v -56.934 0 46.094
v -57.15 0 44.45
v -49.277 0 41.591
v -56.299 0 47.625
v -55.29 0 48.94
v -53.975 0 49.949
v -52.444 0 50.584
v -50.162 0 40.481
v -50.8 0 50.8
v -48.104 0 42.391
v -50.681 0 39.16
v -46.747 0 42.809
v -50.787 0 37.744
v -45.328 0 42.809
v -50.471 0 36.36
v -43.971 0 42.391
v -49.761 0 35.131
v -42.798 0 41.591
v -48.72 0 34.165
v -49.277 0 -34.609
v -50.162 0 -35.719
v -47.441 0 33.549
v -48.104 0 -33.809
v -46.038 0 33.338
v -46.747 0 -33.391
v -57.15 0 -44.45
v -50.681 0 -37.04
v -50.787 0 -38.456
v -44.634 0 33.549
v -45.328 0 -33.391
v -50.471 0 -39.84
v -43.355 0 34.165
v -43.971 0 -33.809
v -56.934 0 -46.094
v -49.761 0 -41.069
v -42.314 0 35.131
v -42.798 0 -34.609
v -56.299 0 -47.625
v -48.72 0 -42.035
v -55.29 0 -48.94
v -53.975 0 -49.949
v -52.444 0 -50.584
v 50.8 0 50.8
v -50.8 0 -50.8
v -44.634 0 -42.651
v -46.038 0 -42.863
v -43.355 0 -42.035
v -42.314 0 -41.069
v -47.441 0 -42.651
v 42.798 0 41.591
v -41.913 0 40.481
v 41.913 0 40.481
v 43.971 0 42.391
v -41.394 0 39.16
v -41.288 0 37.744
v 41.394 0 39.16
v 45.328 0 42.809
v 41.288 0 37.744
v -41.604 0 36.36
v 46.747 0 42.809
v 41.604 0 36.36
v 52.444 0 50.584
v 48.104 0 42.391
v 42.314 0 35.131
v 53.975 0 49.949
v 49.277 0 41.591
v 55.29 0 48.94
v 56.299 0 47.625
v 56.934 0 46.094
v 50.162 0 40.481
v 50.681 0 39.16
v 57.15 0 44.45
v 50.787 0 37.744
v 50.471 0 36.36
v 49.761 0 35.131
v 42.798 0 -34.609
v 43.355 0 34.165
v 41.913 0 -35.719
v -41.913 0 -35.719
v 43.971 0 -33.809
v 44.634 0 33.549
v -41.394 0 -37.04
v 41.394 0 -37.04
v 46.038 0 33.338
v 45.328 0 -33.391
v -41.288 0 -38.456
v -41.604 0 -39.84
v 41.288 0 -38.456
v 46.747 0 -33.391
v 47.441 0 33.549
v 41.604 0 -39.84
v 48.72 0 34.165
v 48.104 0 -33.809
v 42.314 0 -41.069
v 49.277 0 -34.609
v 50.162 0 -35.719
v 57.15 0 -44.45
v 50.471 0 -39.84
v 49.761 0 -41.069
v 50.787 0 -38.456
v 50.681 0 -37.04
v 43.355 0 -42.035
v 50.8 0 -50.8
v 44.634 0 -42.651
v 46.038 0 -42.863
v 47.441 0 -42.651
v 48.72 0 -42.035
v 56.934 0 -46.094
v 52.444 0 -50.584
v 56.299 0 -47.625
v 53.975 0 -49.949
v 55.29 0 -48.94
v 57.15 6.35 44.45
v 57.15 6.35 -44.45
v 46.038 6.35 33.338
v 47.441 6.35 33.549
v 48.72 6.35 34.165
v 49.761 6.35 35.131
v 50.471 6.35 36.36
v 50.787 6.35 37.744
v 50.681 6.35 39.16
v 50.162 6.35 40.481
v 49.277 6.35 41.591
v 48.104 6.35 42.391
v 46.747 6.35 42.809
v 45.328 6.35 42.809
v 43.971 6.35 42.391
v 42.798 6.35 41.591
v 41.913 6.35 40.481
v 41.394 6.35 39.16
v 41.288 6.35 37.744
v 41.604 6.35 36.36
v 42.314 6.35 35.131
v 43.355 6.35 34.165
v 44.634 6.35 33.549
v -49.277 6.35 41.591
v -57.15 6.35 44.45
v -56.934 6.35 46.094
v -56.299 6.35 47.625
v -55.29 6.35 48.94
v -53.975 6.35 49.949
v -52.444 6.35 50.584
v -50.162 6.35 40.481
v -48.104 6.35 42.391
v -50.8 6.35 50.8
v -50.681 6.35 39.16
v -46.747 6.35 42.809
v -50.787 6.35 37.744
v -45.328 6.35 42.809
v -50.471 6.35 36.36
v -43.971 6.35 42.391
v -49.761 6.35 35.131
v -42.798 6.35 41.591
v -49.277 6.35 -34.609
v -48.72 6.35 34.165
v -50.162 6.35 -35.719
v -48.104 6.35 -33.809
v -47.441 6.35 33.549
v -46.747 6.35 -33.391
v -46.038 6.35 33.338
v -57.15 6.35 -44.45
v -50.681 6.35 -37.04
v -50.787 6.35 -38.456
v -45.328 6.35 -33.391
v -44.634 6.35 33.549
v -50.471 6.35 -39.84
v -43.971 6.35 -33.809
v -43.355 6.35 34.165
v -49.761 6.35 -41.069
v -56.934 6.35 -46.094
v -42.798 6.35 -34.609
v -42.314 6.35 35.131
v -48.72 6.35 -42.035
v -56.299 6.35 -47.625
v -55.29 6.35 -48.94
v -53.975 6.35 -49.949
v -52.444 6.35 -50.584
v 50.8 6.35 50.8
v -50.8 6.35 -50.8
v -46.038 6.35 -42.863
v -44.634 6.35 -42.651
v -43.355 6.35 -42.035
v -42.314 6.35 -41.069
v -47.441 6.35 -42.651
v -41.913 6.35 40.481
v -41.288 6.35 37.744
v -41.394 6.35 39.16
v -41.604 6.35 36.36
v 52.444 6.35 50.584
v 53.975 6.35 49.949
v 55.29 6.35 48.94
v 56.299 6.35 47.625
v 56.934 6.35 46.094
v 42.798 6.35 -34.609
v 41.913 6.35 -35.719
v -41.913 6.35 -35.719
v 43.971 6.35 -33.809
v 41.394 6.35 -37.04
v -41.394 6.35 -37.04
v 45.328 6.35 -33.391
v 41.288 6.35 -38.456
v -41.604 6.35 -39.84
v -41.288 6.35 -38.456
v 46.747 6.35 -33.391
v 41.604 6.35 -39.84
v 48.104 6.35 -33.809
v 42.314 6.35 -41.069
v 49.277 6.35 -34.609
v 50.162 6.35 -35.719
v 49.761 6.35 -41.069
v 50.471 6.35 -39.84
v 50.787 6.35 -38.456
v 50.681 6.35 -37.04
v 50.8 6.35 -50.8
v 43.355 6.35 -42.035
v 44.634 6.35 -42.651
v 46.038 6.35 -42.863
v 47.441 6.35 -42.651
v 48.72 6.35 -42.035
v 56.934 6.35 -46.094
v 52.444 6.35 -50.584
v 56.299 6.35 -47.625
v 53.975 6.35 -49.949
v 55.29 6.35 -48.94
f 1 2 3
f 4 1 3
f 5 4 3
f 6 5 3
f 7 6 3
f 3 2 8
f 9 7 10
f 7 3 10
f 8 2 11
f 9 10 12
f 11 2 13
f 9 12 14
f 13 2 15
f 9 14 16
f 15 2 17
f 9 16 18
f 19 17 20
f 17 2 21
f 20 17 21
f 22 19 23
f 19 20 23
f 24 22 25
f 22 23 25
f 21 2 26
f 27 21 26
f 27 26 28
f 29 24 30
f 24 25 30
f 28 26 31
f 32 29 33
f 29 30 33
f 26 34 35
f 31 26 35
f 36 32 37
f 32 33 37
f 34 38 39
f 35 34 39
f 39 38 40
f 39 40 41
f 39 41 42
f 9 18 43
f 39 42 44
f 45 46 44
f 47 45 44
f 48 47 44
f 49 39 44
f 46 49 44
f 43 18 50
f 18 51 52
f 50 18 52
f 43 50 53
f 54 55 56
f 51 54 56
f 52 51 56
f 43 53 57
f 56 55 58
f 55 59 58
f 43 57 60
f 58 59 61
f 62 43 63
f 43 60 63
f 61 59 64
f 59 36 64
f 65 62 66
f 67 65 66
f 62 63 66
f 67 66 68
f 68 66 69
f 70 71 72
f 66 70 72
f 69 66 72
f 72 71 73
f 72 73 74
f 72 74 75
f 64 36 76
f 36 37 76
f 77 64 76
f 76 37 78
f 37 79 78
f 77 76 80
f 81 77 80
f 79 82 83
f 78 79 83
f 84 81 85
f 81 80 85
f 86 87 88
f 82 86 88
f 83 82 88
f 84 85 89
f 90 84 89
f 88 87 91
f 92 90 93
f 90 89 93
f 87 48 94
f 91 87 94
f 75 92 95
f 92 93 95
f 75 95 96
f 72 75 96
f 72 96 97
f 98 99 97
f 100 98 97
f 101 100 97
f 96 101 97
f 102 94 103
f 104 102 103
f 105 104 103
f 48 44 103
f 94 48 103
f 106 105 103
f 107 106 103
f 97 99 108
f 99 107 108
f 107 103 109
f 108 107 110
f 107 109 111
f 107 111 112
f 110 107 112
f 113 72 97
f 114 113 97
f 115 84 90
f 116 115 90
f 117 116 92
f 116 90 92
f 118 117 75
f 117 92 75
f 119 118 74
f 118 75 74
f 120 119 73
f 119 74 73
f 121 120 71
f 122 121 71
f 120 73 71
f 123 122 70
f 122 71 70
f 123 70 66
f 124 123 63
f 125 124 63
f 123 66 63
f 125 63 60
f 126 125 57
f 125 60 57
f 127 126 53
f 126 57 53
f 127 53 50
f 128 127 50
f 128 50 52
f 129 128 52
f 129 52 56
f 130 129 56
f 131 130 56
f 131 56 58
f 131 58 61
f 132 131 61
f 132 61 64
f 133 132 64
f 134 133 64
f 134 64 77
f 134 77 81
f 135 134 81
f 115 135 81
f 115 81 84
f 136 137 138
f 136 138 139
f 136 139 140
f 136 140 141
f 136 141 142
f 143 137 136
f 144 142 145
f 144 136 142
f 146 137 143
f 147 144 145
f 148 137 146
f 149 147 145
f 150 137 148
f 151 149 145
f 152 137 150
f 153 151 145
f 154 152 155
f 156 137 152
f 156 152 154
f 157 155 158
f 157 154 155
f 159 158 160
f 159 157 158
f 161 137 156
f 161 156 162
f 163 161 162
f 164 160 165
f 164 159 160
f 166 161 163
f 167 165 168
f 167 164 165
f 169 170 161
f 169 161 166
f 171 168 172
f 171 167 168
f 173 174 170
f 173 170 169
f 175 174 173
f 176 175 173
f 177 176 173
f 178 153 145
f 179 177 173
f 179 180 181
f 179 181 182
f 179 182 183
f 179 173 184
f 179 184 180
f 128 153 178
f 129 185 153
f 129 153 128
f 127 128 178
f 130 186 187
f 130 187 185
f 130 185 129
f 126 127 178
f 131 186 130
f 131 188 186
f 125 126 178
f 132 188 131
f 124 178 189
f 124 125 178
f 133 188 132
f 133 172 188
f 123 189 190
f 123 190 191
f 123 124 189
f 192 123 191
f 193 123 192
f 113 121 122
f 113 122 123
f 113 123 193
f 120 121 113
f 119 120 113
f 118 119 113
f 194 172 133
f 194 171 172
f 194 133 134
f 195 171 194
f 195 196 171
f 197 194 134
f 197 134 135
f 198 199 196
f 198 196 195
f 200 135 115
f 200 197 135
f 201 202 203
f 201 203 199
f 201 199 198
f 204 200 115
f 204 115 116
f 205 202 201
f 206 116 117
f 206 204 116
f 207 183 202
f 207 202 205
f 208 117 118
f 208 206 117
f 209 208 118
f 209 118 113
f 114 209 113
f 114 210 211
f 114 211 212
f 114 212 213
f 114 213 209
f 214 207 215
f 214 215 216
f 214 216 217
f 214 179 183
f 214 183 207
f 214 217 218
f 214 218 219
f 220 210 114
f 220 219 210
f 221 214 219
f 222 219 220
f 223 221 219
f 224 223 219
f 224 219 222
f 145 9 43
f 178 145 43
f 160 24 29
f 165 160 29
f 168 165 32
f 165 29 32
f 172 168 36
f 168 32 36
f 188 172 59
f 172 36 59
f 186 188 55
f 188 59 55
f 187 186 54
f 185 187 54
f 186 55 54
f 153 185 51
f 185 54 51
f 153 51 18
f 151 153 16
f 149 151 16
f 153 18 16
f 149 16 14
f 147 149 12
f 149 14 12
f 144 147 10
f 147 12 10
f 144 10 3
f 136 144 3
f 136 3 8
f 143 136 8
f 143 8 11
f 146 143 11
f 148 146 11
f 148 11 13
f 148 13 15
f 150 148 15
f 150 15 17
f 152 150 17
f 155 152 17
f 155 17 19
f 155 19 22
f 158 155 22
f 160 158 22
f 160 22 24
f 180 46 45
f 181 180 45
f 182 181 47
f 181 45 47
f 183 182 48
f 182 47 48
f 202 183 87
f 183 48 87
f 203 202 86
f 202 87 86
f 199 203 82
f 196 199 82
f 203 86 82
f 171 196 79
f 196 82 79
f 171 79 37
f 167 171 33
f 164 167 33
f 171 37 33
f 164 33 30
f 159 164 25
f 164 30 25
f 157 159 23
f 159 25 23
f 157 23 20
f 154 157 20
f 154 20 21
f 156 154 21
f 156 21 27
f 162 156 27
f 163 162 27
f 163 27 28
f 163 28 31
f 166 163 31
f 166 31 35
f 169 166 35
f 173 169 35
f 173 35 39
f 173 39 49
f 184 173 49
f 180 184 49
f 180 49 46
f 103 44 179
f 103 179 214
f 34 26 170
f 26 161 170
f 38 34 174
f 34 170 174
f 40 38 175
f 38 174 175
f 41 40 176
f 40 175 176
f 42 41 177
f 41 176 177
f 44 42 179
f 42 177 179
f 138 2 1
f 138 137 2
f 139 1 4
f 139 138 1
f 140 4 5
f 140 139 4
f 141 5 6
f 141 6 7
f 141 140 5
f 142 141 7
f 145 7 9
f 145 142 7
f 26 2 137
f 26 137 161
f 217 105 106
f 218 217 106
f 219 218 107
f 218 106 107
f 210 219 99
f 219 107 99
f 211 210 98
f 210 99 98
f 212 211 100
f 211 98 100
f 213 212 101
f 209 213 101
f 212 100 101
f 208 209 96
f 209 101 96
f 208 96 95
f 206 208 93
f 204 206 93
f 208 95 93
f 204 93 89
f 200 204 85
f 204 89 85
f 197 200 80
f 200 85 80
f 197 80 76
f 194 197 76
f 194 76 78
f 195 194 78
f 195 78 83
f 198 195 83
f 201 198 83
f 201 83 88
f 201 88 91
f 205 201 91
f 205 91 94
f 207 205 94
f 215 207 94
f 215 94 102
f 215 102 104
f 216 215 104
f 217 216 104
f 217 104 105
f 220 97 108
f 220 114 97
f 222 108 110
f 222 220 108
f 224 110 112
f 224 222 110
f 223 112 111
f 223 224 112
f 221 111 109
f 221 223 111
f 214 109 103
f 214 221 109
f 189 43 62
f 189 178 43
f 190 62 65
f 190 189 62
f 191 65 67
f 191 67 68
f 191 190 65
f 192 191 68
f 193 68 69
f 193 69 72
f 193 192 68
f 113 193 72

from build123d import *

# Parameters (mm, degrees)
SKETCH1_W                    = 114.3
SKETCH1_H                    = 101.6
BOSS_EXTRUDE1_DEPTH          = 6.35
FILLET1_R                    = 6.35
F_3_8_0_375_DIAMETER_HOLE1_D = 9.525


with BuildPart() as part:
    # Sketch1 → Boss-Extrude1 (new body)
    with BuildSketch(Plane(origin=(0, 0, 0), x_dir=(1, 0, 0), z_dir=(0, 1, 0))):
        Rectangle(SKETCH1_W, SKETCH1_H)
    extrude(amount=BOSS_EXTRUDE1_DEPTH)

    # Fillet1
    fillet1_edges = [part.edges().sort_by_distance(p)[0] for p in [
        (-57.15, 3.175, -50.8),
        (57.15, 3.175, -50.8),
        (57.15, 3.175, 50.8),
        (-57.15, 3.175, 50.8),
    ]]
    fillet(fillet1_edges, radius=FILLET1_R)

    # 3/8 (0.375) Diameter Hole1 (through all)
    with Locations(Plane(origin=(46.0375, 6.35, 38.1), x_dir=(0, 0, 1), z_dir=(0, 1, 0))):
        with Locations((0, 0), (0, -92.075), (-76.2, -92.075), (-76.2, 0)):
            Hole(F_3_8_0_375_DIAMETER_HOLE1_D / 2)


solid = part.part
